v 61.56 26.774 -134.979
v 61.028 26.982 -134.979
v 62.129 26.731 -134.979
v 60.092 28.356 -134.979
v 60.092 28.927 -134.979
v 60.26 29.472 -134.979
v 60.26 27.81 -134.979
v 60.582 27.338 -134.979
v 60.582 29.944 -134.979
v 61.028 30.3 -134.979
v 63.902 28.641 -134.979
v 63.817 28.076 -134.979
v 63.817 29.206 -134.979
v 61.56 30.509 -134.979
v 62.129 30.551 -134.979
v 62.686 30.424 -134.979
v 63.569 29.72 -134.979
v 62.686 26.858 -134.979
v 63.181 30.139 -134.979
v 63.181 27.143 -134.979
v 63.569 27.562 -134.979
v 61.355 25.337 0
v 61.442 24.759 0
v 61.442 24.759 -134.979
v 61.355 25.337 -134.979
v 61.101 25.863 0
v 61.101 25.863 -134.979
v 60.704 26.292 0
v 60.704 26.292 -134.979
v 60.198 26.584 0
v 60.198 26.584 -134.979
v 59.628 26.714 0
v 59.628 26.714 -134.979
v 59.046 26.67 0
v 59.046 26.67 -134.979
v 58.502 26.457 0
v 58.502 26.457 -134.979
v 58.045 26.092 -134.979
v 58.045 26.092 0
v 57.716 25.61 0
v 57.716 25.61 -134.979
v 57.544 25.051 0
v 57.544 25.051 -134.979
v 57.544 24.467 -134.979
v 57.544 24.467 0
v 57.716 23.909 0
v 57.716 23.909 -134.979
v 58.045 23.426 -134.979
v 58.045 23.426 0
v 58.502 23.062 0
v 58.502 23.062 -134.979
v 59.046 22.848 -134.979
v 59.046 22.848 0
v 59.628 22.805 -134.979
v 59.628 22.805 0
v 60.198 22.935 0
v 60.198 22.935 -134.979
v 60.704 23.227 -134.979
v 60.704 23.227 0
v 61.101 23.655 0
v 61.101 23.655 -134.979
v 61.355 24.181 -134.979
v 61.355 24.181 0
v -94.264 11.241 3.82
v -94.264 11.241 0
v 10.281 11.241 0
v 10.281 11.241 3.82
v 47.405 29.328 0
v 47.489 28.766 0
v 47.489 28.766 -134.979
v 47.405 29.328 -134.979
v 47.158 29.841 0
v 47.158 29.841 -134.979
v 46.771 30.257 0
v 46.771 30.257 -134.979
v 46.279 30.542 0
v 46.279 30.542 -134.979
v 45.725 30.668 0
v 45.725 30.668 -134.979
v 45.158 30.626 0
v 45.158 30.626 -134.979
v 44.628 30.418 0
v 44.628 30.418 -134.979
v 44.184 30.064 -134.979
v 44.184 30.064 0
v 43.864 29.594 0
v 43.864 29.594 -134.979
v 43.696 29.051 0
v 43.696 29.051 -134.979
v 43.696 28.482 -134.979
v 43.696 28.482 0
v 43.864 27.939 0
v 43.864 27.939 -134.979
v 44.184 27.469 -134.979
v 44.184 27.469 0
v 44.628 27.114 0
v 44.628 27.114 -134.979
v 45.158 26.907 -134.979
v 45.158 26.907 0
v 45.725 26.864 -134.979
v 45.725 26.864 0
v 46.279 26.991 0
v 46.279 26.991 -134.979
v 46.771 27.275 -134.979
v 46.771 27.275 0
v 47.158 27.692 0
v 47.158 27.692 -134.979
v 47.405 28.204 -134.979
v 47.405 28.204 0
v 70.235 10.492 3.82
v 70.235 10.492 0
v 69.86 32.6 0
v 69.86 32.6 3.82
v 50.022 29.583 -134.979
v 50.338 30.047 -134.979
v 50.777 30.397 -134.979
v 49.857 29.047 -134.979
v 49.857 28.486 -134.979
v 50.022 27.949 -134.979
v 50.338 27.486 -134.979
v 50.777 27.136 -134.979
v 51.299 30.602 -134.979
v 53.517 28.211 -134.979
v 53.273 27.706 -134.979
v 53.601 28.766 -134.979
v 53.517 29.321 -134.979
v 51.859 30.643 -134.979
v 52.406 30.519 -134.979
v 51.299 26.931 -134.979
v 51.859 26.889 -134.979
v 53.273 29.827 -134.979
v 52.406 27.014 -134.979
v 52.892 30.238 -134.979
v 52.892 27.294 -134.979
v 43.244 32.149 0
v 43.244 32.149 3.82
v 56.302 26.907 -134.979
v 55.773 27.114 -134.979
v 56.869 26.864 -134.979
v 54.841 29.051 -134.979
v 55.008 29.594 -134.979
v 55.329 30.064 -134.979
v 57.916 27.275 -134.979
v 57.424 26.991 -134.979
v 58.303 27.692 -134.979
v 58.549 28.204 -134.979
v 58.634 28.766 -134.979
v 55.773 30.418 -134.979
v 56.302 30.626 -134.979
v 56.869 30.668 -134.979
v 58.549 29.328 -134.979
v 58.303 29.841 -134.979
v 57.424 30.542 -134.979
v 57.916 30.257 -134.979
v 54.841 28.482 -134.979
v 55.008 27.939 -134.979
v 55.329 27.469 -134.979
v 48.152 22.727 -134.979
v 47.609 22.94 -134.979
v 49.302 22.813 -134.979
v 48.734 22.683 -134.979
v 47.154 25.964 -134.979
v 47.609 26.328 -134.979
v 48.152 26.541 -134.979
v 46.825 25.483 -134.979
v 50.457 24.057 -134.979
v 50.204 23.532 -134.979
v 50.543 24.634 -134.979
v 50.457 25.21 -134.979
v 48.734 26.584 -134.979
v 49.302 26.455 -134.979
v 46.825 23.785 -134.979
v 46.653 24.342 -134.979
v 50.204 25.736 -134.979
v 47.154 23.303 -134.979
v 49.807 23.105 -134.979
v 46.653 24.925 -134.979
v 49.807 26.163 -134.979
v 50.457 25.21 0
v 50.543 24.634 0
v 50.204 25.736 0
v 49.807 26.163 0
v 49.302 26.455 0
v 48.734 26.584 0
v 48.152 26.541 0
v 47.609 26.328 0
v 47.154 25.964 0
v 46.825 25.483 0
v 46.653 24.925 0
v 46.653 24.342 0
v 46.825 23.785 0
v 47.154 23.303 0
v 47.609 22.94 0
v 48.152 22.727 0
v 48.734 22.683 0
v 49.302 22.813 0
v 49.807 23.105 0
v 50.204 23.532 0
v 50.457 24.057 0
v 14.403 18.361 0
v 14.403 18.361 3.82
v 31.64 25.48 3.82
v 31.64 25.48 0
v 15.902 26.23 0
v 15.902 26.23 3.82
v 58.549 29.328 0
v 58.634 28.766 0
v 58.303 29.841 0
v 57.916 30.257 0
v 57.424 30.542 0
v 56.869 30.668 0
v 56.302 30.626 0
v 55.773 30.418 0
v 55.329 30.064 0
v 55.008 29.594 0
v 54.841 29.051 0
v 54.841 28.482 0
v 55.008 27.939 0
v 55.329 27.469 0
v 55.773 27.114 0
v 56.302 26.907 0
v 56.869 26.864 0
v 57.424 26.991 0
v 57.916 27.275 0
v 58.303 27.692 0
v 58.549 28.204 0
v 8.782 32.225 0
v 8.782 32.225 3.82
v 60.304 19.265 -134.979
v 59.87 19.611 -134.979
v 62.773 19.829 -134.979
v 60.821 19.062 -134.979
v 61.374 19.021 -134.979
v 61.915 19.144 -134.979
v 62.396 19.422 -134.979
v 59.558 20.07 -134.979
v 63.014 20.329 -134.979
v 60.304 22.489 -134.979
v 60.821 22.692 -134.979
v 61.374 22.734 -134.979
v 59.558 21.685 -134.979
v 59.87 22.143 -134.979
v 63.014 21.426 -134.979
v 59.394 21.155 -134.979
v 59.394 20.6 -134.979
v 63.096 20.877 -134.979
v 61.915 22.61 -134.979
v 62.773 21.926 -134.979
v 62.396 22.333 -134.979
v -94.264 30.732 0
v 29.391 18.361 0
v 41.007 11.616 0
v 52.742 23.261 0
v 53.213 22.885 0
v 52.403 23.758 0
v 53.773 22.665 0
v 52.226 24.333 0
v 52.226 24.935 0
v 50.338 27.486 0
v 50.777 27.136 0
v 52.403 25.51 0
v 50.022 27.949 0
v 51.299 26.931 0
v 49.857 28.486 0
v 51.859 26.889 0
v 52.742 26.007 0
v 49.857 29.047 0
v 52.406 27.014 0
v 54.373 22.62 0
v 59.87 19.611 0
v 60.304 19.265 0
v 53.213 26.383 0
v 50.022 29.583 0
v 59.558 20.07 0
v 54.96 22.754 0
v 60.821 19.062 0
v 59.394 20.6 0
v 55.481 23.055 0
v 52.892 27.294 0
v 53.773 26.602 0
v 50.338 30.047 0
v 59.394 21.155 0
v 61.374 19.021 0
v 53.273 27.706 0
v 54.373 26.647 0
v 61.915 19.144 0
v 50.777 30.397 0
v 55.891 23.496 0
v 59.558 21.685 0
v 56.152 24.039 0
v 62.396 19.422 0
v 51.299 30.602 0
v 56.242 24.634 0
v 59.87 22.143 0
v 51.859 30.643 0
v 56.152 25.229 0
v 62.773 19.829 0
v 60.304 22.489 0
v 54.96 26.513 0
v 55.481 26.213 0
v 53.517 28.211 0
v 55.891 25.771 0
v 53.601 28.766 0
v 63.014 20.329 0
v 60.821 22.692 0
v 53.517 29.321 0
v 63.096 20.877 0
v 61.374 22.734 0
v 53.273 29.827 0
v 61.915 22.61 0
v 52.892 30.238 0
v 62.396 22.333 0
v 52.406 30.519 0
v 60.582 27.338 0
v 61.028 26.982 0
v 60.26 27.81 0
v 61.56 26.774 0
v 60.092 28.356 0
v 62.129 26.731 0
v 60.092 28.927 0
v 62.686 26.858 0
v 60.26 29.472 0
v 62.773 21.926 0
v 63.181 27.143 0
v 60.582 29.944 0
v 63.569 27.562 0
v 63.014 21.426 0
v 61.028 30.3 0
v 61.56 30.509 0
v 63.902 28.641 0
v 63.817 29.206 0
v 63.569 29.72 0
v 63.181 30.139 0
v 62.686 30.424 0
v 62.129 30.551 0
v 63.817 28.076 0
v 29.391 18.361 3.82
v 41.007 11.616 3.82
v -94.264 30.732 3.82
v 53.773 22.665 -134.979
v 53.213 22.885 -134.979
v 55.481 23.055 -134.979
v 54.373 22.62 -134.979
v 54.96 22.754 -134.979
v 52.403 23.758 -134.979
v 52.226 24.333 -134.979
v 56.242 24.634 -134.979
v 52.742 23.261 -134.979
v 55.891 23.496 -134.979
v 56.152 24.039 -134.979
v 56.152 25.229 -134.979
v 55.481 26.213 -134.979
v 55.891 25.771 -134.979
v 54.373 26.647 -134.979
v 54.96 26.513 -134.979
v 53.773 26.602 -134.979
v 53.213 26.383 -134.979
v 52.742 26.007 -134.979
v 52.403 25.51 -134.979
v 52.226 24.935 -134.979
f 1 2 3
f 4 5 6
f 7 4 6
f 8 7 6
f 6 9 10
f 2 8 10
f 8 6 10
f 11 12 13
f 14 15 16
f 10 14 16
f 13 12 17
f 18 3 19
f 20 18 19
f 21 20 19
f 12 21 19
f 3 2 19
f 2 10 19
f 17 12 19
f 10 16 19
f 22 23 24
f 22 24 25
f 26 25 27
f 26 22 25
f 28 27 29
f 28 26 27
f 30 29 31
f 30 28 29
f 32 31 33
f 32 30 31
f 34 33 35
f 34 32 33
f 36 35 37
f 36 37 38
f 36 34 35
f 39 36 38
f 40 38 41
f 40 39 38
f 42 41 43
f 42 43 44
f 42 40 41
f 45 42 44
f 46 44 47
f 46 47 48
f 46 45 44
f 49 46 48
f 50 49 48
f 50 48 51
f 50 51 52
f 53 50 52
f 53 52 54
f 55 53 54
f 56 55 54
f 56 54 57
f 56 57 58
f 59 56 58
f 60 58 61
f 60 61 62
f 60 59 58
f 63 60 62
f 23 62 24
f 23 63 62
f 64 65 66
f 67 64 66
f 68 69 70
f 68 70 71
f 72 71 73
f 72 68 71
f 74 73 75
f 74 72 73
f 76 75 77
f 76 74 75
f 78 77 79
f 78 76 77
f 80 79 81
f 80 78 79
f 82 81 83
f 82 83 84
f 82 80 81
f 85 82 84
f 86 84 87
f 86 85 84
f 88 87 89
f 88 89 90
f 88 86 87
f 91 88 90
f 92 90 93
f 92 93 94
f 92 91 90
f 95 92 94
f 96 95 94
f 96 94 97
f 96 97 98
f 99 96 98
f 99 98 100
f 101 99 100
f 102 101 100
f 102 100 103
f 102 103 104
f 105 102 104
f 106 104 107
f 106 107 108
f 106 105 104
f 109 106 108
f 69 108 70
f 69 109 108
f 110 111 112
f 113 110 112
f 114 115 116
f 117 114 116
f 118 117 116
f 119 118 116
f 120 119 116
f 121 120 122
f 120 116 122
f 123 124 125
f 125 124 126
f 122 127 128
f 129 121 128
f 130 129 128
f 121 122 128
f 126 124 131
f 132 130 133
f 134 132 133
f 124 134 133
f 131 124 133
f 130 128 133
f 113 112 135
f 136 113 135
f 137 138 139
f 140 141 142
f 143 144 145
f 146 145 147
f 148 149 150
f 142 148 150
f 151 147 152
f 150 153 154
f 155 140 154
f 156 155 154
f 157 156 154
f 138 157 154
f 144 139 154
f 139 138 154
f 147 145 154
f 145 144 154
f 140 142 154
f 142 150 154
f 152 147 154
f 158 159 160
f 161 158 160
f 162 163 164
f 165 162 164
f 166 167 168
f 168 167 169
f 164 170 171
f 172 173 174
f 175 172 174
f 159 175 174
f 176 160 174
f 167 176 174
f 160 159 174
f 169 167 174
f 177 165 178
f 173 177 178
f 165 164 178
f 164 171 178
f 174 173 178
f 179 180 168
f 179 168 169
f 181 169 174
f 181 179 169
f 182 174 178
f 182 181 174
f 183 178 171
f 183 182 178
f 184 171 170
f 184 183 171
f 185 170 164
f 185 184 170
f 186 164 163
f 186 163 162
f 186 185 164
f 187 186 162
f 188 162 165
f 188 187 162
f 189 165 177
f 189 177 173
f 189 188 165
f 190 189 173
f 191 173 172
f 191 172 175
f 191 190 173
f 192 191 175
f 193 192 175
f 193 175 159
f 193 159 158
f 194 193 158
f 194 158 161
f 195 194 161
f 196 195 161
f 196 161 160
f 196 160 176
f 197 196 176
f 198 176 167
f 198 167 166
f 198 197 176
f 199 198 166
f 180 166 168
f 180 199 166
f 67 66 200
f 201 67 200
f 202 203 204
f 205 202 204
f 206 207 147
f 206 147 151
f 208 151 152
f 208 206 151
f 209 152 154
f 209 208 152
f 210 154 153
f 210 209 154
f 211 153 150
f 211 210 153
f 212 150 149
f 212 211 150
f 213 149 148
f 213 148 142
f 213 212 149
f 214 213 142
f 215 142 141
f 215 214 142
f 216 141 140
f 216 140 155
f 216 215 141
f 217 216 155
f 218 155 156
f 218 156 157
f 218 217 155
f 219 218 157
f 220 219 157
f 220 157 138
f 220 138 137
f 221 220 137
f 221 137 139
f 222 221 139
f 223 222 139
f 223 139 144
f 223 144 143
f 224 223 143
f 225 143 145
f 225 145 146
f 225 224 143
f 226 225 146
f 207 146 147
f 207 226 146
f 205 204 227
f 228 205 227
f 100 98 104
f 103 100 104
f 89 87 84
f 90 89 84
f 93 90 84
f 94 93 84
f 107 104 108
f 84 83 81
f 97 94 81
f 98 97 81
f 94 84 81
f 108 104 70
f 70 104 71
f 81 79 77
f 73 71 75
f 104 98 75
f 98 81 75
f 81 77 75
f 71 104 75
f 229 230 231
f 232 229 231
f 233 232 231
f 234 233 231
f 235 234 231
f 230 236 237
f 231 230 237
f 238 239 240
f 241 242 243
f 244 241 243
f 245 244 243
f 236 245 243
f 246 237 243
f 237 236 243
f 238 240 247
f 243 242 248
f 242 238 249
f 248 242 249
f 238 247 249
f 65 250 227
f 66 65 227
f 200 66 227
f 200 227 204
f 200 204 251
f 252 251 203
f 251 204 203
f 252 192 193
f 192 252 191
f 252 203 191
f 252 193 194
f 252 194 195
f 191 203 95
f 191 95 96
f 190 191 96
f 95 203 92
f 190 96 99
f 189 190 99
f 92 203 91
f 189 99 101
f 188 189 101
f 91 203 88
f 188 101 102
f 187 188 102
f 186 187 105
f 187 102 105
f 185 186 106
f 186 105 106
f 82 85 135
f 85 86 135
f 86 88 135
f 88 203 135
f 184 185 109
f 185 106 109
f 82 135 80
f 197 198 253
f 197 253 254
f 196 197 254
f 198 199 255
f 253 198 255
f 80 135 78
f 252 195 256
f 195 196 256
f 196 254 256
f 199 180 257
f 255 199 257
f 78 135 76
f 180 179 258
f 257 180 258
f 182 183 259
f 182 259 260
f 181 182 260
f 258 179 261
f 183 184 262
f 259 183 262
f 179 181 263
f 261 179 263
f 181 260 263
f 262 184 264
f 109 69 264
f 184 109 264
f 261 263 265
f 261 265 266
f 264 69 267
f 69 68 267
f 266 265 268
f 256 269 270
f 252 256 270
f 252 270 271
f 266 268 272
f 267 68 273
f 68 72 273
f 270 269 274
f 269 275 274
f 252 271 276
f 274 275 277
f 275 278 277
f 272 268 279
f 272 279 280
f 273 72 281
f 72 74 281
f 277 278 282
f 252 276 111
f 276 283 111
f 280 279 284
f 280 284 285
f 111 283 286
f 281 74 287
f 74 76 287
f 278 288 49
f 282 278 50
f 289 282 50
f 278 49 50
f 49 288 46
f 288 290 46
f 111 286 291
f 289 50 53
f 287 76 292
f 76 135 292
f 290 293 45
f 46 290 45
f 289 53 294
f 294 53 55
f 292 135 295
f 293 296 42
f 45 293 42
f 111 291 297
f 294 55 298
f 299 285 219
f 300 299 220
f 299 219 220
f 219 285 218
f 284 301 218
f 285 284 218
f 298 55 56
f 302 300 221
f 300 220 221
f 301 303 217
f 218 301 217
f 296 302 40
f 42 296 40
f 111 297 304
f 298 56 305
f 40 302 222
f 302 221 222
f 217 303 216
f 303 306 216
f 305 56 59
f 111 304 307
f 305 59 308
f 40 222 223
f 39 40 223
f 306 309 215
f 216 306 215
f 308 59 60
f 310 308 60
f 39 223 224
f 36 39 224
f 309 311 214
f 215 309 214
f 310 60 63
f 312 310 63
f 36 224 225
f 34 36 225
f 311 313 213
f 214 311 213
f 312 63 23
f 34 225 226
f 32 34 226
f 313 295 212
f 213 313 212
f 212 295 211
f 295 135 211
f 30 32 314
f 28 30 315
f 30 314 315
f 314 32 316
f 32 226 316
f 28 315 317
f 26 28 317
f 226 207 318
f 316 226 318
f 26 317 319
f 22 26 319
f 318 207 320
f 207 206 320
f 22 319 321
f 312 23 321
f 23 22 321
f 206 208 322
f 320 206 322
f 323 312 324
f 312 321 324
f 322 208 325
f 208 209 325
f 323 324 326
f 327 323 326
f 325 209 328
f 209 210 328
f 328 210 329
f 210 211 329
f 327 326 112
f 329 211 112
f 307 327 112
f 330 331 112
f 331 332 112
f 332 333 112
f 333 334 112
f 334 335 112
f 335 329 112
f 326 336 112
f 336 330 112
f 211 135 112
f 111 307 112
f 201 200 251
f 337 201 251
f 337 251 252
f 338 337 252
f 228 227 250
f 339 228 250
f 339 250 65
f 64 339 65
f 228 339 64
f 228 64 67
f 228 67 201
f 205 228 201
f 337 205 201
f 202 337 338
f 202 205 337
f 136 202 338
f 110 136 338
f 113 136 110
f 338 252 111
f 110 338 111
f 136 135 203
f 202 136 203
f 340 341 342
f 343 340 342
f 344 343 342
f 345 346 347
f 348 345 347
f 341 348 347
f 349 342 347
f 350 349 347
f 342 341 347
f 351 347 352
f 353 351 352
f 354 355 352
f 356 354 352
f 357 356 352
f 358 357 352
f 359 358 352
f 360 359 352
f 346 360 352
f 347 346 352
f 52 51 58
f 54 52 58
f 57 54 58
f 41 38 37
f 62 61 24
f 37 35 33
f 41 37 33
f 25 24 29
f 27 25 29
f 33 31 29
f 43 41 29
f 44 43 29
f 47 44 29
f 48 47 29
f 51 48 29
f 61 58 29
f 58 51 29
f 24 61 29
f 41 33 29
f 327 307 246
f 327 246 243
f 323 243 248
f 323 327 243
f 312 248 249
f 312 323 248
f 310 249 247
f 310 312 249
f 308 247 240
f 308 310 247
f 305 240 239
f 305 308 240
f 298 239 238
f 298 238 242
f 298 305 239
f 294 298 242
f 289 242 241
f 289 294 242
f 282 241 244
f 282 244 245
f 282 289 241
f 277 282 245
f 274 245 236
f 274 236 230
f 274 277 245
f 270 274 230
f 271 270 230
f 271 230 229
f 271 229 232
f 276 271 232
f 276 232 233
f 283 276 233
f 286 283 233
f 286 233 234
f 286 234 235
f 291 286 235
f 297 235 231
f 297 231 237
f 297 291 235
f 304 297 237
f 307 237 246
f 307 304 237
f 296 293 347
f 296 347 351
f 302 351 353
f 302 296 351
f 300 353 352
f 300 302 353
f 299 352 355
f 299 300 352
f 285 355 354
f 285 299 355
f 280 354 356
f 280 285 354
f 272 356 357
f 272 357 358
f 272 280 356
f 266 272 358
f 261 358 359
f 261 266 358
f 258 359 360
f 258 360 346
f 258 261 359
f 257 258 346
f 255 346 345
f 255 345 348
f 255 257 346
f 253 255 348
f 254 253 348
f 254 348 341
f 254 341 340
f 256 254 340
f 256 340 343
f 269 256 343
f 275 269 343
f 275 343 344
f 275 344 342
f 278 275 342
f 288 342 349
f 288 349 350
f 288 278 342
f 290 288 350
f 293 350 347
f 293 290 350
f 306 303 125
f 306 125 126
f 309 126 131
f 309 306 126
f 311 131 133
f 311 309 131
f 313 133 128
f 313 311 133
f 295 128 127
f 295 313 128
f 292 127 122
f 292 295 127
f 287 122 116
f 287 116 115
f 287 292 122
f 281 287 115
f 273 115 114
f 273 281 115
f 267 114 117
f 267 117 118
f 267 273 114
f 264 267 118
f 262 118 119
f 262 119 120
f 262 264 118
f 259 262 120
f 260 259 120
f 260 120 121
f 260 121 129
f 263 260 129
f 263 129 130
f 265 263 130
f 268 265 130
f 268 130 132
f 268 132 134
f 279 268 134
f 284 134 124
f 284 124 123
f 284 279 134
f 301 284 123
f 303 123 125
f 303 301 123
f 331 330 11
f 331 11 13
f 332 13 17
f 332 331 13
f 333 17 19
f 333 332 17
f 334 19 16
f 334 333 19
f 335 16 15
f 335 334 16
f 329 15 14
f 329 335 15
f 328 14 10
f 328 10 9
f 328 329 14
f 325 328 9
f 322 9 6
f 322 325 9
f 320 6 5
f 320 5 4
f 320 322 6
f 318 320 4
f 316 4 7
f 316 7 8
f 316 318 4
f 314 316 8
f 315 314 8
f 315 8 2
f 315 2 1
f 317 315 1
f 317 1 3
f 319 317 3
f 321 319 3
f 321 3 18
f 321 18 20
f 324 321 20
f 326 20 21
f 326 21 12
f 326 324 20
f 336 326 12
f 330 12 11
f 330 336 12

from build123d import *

# Parameters (mm, degrees)
F1_DEPTH = 3.820417
F2_R     = 1.90733
F2_R_2   = 1.882505
F2_R_3   = 1.907323
F2_R_4   = 1.915535
F2_R_5   = 1.861563
F2_R_6   = 1.960041
F2_R_7   = 2.019149
F2_R_8   = 1.956034
F3_DEPTH = 134.979174


with BuildPart() as f1:
    # F0 (on Top) → F1 (new body)
    with BuildSketch(Plane.XY):
        Polygon((8.782074, 32.225236), (-94.263762, 30.731819), (-94.263762, 11.241347), (10.280922, 11.241347), (14.402747, 18.360883), (29.391229, 18.360883), (41.00731, 11.616066), (70.23485, 10.491922), (69.860145, 32.599941), (43.244176, 32.148832), (31.639501, 25.480404), (15.901595, 26.229829), align=None)
    extrude(amount=F1_DEPTH)

    # F2 (on Top) → F3 (join)
    with BuildSketch(Plane.XY):
        with Locations((45.582108, 28.766241)):
            Circle(F2_R)
        with Locations((51.718004, 28.766241)):
            Circle(F2_R_2)
        with Locations((56.726903, 28.766241)):
            Circle(F2_R_3)
        with Locations((61.986238, 28.641015)):
            Circle(F2_R_4)
        with Locations((61.234906, 20.877231)):
            Circle(F2_R_5)
        with Locations((59.481792, 24.759125)):
            Circle(F2_R_6)
        with Locations((54.22245, 24.633903)):
            Circle(F2_R_7)
        with Locations((48.587449, 24.633903)):
            Circle(F2_R_8)
    extrude(amount=-F3_DEPTH)


solid = f1.part
